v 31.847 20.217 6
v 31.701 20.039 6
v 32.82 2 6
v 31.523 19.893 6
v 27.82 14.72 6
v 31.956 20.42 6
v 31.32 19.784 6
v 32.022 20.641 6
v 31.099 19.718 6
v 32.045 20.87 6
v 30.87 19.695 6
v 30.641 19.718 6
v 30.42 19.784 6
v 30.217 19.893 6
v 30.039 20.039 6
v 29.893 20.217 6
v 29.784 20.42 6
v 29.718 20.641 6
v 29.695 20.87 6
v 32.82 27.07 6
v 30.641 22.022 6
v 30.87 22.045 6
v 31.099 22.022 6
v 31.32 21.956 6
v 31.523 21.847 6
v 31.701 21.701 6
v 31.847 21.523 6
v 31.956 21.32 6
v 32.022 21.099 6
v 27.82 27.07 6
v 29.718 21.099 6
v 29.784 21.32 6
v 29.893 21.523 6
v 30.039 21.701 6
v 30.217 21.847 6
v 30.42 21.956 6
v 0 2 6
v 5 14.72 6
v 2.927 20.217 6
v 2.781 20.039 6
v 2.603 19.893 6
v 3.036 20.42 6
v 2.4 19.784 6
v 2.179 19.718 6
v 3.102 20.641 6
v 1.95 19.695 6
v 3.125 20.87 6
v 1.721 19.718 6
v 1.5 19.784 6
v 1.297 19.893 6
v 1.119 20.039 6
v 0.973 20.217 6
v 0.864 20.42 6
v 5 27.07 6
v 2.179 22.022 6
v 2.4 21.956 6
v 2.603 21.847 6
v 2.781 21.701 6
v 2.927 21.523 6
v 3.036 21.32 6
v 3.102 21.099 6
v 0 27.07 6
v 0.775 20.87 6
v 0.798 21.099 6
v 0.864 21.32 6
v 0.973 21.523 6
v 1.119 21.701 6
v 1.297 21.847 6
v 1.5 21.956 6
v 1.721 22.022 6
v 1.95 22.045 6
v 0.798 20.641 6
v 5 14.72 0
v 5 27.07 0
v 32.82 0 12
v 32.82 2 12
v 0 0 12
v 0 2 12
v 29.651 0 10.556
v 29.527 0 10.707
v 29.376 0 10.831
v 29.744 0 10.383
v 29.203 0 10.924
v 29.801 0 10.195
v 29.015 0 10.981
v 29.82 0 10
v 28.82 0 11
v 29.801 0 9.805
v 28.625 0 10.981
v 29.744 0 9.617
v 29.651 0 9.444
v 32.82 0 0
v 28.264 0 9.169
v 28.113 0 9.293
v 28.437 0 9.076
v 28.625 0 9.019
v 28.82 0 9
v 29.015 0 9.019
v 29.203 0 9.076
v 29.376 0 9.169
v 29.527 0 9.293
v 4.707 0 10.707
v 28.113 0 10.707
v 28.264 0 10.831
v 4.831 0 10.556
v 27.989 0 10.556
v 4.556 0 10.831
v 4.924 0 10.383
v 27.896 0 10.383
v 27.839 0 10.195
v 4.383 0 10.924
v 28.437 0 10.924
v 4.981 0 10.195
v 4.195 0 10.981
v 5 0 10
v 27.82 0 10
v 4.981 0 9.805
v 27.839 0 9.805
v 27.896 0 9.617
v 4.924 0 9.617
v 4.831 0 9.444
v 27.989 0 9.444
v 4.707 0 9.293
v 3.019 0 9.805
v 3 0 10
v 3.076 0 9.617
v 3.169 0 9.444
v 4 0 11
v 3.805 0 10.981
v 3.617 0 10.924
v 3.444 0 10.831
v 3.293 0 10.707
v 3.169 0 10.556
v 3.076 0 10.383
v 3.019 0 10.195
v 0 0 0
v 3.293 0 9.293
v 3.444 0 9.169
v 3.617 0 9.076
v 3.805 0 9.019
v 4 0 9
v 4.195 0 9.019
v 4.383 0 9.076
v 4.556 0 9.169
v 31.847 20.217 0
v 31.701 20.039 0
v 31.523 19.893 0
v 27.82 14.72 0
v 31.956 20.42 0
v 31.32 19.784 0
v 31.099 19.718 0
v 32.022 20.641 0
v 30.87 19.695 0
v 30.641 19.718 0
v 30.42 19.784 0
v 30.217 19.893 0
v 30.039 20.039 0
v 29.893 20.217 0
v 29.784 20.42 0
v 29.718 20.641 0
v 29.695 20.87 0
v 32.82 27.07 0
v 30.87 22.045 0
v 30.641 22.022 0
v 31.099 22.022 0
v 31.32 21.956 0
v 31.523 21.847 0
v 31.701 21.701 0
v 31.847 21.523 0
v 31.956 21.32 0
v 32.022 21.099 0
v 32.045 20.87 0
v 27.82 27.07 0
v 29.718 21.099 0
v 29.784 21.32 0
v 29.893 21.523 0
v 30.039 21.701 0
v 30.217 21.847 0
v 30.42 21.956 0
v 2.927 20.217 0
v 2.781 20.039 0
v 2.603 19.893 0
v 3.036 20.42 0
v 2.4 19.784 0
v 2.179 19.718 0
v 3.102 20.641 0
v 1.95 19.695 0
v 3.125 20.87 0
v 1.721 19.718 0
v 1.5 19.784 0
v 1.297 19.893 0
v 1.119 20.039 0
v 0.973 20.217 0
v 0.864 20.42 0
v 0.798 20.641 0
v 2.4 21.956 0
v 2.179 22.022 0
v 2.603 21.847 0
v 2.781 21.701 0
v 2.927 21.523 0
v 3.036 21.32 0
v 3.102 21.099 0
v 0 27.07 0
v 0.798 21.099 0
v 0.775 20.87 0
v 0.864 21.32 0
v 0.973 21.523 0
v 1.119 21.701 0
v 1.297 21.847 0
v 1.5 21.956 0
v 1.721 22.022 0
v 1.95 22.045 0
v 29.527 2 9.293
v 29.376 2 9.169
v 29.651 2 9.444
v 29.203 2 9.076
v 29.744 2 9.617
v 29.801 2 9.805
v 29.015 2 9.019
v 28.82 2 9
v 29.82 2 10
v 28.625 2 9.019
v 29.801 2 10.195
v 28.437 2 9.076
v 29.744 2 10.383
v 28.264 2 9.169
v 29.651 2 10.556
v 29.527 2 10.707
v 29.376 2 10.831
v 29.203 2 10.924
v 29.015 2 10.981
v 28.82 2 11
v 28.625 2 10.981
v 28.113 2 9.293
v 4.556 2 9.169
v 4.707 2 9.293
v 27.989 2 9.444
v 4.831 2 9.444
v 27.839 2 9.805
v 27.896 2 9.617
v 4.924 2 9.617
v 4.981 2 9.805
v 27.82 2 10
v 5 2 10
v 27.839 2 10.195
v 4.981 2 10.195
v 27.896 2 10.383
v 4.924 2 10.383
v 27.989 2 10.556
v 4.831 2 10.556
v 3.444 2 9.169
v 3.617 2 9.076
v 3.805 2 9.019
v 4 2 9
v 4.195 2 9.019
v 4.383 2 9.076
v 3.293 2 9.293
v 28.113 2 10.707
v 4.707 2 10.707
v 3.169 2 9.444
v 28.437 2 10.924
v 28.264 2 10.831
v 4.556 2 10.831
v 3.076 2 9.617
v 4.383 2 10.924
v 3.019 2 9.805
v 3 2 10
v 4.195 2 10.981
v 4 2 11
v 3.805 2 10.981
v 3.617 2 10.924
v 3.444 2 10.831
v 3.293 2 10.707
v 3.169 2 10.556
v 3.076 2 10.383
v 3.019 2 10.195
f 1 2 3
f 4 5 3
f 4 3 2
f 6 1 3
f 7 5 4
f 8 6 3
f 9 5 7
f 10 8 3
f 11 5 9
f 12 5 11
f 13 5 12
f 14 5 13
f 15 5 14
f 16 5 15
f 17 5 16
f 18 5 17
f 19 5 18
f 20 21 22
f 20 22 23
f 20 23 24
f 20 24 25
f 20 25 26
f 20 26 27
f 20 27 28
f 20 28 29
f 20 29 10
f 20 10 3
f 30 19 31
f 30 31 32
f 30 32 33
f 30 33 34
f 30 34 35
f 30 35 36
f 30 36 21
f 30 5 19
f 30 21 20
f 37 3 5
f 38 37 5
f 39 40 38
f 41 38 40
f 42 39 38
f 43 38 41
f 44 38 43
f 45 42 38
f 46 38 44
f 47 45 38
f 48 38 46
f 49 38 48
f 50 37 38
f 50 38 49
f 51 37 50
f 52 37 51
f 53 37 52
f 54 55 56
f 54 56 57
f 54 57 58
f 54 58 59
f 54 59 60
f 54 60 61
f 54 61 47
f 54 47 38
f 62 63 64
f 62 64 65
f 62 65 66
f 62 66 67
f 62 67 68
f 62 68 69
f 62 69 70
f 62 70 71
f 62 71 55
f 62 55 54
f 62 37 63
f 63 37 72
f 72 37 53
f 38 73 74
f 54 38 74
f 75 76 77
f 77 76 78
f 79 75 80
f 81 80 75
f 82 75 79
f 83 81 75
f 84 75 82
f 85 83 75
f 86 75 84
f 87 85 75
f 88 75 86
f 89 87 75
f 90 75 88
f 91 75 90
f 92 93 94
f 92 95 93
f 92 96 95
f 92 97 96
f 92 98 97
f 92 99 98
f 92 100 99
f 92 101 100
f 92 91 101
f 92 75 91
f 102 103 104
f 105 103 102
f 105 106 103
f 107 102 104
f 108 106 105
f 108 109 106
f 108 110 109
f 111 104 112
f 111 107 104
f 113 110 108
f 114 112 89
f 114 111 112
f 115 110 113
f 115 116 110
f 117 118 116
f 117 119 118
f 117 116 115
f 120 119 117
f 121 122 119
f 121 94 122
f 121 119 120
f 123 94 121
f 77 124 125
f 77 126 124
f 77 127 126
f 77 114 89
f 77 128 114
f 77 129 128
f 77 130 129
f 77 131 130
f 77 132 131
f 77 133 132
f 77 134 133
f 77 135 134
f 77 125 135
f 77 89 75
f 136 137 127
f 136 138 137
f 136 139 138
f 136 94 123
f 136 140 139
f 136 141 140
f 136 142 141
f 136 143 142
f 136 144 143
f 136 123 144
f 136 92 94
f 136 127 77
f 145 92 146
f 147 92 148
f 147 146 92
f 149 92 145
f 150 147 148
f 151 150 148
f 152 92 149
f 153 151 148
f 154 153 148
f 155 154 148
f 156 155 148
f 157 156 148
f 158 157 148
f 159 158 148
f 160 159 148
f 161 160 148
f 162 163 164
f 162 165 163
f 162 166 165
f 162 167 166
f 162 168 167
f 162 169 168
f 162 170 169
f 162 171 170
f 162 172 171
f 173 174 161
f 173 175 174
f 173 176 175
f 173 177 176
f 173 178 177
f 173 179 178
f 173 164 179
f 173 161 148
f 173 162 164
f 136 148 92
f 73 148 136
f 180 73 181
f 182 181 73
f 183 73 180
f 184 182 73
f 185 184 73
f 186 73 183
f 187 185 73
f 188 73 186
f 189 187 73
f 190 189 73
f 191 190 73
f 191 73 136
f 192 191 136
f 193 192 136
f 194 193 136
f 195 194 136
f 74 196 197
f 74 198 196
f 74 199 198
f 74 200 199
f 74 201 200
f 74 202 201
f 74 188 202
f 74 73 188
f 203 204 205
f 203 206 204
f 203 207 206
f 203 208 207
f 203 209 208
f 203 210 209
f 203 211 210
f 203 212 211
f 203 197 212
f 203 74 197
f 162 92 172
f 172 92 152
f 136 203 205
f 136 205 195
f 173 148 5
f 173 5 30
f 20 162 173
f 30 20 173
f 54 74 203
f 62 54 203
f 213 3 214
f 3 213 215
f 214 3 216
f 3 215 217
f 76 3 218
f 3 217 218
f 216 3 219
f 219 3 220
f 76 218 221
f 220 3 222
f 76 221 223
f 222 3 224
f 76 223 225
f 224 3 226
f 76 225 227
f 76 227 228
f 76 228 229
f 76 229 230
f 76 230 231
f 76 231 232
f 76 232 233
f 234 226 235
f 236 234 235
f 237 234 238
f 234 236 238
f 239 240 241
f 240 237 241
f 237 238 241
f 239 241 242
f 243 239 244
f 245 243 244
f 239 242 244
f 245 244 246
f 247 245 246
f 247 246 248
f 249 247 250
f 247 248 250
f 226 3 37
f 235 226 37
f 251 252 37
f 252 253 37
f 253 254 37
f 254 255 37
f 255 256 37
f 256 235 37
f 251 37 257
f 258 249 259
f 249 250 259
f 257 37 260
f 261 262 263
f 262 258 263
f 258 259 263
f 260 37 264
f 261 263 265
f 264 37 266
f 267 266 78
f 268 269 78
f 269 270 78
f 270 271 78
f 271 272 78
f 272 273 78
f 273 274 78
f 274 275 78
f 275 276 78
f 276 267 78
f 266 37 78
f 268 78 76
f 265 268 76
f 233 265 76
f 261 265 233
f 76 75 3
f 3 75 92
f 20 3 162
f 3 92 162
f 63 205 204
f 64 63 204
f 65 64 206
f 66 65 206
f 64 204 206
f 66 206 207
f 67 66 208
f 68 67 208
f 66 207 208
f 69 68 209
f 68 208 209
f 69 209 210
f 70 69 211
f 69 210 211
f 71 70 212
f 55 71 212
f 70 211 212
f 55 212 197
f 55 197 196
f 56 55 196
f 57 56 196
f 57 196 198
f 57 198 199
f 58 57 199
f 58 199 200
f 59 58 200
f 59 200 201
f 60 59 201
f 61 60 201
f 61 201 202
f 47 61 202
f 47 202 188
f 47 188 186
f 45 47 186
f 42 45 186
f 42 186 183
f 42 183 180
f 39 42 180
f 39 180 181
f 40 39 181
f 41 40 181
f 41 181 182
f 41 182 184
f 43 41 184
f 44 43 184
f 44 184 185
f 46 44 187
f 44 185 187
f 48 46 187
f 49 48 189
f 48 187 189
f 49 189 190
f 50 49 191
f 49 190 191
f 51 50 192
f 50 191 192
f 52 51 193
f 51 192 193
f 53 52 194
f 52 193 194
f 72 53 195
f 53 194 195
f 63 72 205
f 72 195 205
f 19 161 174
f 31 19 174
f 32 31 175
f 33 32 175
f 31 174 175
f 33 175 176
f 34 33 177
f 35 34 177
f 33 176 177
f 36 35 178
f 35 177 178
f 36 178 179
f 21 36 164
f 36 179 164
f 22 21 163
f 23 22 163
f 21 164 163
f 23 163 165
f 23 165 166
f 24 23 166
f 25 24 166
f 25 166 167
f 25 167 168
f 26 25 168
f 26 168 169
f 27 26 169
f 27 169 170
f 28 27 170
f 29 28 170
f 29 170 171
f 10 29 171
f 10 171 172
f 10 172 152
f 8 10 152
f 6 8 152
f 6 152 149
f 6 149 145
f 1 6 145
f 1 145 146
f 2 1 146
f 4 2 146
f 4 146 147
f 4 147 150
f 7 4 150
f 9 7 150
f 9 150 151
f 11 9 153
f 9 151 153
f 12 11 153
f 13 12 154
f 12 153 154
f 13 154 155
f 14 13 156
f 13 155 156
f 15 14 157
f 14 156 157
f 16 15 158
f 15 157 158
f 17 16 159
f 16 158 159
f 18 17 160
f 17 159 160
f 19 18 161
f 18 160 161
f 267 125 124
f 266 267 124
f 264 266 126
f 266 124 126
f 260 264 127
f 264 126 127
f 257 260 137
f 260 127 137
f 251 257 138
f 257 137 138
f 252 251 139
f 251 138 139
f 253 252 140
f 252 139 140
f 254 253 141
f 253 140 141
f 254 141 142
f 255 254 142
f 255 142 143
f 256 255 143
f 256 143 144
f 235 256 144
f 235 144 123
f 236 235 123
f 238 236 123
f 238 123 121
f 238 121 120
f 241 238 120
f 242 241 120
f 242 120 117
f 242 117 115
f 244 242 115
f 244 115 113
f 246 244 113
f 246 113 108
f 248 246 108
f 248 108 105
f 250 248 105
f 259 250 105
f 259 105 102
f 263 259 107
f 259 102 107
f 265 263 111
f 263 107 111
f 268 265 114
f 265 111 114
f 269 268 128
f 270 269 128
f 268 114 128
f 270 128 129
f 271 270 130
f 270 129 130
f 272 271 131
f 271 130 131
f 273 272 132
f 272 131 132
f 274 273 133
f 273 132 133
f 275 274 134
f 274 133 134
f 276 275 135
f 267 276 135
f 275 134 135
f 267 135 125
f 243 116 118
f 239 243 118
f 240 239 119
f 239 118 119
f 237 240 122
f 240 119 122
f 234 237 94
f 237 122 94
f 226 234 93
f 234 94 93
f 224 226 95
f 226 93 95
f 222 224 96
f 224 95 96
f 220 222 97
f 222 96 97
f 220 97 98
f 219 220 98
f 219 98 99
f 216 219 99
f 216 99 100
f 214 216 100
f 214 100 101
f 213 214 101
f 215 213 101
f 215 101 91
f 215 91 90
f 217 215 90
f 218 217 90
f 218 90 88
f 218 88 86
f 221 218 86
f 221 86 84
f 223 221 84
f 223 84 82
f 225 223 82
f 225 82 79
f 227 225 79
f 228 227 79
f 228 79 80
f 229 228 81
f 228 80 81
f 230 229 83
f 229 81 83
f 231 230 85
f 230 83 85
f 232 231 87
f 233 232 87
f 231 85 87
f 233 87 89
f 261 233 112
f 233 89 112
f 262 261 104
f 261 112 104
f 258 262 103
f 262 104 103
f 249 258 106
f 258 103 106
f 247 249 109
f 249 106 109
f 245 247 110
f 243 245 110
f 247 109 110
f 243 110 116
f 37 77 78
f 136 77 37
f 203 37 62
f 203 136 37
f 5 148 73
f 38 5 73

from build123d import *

# Parameters (mm, degrees)
SKETCH1_W                    = 32.82
SKETCH1_H                    = 27.07
BOSS_EXTRUDE1_DEPTH          = 12
SKETCH2_W                    = 6
SKETCH2_H                    = 25.07
CUT_EXTRUDE1_DEPTH           = 45.203362994
SKETCH3_W                    = 22.82
SKETCH3_H                    = 12.35
CUT_EXTRUDE2_DEPTH           = 45.203362994
F_2_35_2_35_DIAMETER_HOLE1_D = 2.35
F_2_0_2_DIAMETER_HOLE1_D     = 2


with BuildPart() as part:
    # Sketch1 → Boss-Extrude1 (new body)
    with BuildSketch(Plane(origin=(0, 0, 0), x_dir=(-1, 0, 0), z_dir=(0, 0, -1))):
        with Locations((-16.41, 13.535)):
            Rectangle(SKETCH1_W, SKETCH1_H)
    extrude(amount=-BOSS_EXTRUDE1_DEPTH)

    # Sketch2 → Cut-Extrude1 (cut, through all)
    with BuildSketch(Plane.ZY):
        with Locations((9, 14.535)):
            Rectangle(SKETCH2_W, SKETCH2_H)
    extrude(amount=-CUT_EXTRUDE1_DEPTH, mode=Mode.SUBTRACT)

    # Sketch3 → Cut-Extrude2 (cut, through all)
    with BuildSketch(Plane(origin=(0, 0, 0), x_dir=(-1, 0, 0), z_dir=(0, 0, -1))):
        with Locations((-16.41, 20.895)):
            Rectangle(SKETCH3_W, SKETCH3_H)
    extrude(amount=-CUT_EXTRUDE2_DEPTH, mode=Mode.SUBTRACT)

    # Ø2.35 (2.35) Diameter Hole1 (through all)
    with Locations(Plane.XY.offset(6)):
        with Locations((1.95, 20.87), (30.87, 20.87)):
            Hole(F_2_35_2_35_DIAMETER_HOLE1_D / 2)

    # Ø2.0 (2) Diameter Hole1 (through all)
    with Locations(Plane(origin=(0, 2, 0), x_dir=(1, 0, 0), z_dir=(0, 1, 0))):
        with Locations((28.82, -10), (4, -10)):
            Hole(F_2_0_2_DIAMETER_HOLE1_D / 2)


solid = part.part
